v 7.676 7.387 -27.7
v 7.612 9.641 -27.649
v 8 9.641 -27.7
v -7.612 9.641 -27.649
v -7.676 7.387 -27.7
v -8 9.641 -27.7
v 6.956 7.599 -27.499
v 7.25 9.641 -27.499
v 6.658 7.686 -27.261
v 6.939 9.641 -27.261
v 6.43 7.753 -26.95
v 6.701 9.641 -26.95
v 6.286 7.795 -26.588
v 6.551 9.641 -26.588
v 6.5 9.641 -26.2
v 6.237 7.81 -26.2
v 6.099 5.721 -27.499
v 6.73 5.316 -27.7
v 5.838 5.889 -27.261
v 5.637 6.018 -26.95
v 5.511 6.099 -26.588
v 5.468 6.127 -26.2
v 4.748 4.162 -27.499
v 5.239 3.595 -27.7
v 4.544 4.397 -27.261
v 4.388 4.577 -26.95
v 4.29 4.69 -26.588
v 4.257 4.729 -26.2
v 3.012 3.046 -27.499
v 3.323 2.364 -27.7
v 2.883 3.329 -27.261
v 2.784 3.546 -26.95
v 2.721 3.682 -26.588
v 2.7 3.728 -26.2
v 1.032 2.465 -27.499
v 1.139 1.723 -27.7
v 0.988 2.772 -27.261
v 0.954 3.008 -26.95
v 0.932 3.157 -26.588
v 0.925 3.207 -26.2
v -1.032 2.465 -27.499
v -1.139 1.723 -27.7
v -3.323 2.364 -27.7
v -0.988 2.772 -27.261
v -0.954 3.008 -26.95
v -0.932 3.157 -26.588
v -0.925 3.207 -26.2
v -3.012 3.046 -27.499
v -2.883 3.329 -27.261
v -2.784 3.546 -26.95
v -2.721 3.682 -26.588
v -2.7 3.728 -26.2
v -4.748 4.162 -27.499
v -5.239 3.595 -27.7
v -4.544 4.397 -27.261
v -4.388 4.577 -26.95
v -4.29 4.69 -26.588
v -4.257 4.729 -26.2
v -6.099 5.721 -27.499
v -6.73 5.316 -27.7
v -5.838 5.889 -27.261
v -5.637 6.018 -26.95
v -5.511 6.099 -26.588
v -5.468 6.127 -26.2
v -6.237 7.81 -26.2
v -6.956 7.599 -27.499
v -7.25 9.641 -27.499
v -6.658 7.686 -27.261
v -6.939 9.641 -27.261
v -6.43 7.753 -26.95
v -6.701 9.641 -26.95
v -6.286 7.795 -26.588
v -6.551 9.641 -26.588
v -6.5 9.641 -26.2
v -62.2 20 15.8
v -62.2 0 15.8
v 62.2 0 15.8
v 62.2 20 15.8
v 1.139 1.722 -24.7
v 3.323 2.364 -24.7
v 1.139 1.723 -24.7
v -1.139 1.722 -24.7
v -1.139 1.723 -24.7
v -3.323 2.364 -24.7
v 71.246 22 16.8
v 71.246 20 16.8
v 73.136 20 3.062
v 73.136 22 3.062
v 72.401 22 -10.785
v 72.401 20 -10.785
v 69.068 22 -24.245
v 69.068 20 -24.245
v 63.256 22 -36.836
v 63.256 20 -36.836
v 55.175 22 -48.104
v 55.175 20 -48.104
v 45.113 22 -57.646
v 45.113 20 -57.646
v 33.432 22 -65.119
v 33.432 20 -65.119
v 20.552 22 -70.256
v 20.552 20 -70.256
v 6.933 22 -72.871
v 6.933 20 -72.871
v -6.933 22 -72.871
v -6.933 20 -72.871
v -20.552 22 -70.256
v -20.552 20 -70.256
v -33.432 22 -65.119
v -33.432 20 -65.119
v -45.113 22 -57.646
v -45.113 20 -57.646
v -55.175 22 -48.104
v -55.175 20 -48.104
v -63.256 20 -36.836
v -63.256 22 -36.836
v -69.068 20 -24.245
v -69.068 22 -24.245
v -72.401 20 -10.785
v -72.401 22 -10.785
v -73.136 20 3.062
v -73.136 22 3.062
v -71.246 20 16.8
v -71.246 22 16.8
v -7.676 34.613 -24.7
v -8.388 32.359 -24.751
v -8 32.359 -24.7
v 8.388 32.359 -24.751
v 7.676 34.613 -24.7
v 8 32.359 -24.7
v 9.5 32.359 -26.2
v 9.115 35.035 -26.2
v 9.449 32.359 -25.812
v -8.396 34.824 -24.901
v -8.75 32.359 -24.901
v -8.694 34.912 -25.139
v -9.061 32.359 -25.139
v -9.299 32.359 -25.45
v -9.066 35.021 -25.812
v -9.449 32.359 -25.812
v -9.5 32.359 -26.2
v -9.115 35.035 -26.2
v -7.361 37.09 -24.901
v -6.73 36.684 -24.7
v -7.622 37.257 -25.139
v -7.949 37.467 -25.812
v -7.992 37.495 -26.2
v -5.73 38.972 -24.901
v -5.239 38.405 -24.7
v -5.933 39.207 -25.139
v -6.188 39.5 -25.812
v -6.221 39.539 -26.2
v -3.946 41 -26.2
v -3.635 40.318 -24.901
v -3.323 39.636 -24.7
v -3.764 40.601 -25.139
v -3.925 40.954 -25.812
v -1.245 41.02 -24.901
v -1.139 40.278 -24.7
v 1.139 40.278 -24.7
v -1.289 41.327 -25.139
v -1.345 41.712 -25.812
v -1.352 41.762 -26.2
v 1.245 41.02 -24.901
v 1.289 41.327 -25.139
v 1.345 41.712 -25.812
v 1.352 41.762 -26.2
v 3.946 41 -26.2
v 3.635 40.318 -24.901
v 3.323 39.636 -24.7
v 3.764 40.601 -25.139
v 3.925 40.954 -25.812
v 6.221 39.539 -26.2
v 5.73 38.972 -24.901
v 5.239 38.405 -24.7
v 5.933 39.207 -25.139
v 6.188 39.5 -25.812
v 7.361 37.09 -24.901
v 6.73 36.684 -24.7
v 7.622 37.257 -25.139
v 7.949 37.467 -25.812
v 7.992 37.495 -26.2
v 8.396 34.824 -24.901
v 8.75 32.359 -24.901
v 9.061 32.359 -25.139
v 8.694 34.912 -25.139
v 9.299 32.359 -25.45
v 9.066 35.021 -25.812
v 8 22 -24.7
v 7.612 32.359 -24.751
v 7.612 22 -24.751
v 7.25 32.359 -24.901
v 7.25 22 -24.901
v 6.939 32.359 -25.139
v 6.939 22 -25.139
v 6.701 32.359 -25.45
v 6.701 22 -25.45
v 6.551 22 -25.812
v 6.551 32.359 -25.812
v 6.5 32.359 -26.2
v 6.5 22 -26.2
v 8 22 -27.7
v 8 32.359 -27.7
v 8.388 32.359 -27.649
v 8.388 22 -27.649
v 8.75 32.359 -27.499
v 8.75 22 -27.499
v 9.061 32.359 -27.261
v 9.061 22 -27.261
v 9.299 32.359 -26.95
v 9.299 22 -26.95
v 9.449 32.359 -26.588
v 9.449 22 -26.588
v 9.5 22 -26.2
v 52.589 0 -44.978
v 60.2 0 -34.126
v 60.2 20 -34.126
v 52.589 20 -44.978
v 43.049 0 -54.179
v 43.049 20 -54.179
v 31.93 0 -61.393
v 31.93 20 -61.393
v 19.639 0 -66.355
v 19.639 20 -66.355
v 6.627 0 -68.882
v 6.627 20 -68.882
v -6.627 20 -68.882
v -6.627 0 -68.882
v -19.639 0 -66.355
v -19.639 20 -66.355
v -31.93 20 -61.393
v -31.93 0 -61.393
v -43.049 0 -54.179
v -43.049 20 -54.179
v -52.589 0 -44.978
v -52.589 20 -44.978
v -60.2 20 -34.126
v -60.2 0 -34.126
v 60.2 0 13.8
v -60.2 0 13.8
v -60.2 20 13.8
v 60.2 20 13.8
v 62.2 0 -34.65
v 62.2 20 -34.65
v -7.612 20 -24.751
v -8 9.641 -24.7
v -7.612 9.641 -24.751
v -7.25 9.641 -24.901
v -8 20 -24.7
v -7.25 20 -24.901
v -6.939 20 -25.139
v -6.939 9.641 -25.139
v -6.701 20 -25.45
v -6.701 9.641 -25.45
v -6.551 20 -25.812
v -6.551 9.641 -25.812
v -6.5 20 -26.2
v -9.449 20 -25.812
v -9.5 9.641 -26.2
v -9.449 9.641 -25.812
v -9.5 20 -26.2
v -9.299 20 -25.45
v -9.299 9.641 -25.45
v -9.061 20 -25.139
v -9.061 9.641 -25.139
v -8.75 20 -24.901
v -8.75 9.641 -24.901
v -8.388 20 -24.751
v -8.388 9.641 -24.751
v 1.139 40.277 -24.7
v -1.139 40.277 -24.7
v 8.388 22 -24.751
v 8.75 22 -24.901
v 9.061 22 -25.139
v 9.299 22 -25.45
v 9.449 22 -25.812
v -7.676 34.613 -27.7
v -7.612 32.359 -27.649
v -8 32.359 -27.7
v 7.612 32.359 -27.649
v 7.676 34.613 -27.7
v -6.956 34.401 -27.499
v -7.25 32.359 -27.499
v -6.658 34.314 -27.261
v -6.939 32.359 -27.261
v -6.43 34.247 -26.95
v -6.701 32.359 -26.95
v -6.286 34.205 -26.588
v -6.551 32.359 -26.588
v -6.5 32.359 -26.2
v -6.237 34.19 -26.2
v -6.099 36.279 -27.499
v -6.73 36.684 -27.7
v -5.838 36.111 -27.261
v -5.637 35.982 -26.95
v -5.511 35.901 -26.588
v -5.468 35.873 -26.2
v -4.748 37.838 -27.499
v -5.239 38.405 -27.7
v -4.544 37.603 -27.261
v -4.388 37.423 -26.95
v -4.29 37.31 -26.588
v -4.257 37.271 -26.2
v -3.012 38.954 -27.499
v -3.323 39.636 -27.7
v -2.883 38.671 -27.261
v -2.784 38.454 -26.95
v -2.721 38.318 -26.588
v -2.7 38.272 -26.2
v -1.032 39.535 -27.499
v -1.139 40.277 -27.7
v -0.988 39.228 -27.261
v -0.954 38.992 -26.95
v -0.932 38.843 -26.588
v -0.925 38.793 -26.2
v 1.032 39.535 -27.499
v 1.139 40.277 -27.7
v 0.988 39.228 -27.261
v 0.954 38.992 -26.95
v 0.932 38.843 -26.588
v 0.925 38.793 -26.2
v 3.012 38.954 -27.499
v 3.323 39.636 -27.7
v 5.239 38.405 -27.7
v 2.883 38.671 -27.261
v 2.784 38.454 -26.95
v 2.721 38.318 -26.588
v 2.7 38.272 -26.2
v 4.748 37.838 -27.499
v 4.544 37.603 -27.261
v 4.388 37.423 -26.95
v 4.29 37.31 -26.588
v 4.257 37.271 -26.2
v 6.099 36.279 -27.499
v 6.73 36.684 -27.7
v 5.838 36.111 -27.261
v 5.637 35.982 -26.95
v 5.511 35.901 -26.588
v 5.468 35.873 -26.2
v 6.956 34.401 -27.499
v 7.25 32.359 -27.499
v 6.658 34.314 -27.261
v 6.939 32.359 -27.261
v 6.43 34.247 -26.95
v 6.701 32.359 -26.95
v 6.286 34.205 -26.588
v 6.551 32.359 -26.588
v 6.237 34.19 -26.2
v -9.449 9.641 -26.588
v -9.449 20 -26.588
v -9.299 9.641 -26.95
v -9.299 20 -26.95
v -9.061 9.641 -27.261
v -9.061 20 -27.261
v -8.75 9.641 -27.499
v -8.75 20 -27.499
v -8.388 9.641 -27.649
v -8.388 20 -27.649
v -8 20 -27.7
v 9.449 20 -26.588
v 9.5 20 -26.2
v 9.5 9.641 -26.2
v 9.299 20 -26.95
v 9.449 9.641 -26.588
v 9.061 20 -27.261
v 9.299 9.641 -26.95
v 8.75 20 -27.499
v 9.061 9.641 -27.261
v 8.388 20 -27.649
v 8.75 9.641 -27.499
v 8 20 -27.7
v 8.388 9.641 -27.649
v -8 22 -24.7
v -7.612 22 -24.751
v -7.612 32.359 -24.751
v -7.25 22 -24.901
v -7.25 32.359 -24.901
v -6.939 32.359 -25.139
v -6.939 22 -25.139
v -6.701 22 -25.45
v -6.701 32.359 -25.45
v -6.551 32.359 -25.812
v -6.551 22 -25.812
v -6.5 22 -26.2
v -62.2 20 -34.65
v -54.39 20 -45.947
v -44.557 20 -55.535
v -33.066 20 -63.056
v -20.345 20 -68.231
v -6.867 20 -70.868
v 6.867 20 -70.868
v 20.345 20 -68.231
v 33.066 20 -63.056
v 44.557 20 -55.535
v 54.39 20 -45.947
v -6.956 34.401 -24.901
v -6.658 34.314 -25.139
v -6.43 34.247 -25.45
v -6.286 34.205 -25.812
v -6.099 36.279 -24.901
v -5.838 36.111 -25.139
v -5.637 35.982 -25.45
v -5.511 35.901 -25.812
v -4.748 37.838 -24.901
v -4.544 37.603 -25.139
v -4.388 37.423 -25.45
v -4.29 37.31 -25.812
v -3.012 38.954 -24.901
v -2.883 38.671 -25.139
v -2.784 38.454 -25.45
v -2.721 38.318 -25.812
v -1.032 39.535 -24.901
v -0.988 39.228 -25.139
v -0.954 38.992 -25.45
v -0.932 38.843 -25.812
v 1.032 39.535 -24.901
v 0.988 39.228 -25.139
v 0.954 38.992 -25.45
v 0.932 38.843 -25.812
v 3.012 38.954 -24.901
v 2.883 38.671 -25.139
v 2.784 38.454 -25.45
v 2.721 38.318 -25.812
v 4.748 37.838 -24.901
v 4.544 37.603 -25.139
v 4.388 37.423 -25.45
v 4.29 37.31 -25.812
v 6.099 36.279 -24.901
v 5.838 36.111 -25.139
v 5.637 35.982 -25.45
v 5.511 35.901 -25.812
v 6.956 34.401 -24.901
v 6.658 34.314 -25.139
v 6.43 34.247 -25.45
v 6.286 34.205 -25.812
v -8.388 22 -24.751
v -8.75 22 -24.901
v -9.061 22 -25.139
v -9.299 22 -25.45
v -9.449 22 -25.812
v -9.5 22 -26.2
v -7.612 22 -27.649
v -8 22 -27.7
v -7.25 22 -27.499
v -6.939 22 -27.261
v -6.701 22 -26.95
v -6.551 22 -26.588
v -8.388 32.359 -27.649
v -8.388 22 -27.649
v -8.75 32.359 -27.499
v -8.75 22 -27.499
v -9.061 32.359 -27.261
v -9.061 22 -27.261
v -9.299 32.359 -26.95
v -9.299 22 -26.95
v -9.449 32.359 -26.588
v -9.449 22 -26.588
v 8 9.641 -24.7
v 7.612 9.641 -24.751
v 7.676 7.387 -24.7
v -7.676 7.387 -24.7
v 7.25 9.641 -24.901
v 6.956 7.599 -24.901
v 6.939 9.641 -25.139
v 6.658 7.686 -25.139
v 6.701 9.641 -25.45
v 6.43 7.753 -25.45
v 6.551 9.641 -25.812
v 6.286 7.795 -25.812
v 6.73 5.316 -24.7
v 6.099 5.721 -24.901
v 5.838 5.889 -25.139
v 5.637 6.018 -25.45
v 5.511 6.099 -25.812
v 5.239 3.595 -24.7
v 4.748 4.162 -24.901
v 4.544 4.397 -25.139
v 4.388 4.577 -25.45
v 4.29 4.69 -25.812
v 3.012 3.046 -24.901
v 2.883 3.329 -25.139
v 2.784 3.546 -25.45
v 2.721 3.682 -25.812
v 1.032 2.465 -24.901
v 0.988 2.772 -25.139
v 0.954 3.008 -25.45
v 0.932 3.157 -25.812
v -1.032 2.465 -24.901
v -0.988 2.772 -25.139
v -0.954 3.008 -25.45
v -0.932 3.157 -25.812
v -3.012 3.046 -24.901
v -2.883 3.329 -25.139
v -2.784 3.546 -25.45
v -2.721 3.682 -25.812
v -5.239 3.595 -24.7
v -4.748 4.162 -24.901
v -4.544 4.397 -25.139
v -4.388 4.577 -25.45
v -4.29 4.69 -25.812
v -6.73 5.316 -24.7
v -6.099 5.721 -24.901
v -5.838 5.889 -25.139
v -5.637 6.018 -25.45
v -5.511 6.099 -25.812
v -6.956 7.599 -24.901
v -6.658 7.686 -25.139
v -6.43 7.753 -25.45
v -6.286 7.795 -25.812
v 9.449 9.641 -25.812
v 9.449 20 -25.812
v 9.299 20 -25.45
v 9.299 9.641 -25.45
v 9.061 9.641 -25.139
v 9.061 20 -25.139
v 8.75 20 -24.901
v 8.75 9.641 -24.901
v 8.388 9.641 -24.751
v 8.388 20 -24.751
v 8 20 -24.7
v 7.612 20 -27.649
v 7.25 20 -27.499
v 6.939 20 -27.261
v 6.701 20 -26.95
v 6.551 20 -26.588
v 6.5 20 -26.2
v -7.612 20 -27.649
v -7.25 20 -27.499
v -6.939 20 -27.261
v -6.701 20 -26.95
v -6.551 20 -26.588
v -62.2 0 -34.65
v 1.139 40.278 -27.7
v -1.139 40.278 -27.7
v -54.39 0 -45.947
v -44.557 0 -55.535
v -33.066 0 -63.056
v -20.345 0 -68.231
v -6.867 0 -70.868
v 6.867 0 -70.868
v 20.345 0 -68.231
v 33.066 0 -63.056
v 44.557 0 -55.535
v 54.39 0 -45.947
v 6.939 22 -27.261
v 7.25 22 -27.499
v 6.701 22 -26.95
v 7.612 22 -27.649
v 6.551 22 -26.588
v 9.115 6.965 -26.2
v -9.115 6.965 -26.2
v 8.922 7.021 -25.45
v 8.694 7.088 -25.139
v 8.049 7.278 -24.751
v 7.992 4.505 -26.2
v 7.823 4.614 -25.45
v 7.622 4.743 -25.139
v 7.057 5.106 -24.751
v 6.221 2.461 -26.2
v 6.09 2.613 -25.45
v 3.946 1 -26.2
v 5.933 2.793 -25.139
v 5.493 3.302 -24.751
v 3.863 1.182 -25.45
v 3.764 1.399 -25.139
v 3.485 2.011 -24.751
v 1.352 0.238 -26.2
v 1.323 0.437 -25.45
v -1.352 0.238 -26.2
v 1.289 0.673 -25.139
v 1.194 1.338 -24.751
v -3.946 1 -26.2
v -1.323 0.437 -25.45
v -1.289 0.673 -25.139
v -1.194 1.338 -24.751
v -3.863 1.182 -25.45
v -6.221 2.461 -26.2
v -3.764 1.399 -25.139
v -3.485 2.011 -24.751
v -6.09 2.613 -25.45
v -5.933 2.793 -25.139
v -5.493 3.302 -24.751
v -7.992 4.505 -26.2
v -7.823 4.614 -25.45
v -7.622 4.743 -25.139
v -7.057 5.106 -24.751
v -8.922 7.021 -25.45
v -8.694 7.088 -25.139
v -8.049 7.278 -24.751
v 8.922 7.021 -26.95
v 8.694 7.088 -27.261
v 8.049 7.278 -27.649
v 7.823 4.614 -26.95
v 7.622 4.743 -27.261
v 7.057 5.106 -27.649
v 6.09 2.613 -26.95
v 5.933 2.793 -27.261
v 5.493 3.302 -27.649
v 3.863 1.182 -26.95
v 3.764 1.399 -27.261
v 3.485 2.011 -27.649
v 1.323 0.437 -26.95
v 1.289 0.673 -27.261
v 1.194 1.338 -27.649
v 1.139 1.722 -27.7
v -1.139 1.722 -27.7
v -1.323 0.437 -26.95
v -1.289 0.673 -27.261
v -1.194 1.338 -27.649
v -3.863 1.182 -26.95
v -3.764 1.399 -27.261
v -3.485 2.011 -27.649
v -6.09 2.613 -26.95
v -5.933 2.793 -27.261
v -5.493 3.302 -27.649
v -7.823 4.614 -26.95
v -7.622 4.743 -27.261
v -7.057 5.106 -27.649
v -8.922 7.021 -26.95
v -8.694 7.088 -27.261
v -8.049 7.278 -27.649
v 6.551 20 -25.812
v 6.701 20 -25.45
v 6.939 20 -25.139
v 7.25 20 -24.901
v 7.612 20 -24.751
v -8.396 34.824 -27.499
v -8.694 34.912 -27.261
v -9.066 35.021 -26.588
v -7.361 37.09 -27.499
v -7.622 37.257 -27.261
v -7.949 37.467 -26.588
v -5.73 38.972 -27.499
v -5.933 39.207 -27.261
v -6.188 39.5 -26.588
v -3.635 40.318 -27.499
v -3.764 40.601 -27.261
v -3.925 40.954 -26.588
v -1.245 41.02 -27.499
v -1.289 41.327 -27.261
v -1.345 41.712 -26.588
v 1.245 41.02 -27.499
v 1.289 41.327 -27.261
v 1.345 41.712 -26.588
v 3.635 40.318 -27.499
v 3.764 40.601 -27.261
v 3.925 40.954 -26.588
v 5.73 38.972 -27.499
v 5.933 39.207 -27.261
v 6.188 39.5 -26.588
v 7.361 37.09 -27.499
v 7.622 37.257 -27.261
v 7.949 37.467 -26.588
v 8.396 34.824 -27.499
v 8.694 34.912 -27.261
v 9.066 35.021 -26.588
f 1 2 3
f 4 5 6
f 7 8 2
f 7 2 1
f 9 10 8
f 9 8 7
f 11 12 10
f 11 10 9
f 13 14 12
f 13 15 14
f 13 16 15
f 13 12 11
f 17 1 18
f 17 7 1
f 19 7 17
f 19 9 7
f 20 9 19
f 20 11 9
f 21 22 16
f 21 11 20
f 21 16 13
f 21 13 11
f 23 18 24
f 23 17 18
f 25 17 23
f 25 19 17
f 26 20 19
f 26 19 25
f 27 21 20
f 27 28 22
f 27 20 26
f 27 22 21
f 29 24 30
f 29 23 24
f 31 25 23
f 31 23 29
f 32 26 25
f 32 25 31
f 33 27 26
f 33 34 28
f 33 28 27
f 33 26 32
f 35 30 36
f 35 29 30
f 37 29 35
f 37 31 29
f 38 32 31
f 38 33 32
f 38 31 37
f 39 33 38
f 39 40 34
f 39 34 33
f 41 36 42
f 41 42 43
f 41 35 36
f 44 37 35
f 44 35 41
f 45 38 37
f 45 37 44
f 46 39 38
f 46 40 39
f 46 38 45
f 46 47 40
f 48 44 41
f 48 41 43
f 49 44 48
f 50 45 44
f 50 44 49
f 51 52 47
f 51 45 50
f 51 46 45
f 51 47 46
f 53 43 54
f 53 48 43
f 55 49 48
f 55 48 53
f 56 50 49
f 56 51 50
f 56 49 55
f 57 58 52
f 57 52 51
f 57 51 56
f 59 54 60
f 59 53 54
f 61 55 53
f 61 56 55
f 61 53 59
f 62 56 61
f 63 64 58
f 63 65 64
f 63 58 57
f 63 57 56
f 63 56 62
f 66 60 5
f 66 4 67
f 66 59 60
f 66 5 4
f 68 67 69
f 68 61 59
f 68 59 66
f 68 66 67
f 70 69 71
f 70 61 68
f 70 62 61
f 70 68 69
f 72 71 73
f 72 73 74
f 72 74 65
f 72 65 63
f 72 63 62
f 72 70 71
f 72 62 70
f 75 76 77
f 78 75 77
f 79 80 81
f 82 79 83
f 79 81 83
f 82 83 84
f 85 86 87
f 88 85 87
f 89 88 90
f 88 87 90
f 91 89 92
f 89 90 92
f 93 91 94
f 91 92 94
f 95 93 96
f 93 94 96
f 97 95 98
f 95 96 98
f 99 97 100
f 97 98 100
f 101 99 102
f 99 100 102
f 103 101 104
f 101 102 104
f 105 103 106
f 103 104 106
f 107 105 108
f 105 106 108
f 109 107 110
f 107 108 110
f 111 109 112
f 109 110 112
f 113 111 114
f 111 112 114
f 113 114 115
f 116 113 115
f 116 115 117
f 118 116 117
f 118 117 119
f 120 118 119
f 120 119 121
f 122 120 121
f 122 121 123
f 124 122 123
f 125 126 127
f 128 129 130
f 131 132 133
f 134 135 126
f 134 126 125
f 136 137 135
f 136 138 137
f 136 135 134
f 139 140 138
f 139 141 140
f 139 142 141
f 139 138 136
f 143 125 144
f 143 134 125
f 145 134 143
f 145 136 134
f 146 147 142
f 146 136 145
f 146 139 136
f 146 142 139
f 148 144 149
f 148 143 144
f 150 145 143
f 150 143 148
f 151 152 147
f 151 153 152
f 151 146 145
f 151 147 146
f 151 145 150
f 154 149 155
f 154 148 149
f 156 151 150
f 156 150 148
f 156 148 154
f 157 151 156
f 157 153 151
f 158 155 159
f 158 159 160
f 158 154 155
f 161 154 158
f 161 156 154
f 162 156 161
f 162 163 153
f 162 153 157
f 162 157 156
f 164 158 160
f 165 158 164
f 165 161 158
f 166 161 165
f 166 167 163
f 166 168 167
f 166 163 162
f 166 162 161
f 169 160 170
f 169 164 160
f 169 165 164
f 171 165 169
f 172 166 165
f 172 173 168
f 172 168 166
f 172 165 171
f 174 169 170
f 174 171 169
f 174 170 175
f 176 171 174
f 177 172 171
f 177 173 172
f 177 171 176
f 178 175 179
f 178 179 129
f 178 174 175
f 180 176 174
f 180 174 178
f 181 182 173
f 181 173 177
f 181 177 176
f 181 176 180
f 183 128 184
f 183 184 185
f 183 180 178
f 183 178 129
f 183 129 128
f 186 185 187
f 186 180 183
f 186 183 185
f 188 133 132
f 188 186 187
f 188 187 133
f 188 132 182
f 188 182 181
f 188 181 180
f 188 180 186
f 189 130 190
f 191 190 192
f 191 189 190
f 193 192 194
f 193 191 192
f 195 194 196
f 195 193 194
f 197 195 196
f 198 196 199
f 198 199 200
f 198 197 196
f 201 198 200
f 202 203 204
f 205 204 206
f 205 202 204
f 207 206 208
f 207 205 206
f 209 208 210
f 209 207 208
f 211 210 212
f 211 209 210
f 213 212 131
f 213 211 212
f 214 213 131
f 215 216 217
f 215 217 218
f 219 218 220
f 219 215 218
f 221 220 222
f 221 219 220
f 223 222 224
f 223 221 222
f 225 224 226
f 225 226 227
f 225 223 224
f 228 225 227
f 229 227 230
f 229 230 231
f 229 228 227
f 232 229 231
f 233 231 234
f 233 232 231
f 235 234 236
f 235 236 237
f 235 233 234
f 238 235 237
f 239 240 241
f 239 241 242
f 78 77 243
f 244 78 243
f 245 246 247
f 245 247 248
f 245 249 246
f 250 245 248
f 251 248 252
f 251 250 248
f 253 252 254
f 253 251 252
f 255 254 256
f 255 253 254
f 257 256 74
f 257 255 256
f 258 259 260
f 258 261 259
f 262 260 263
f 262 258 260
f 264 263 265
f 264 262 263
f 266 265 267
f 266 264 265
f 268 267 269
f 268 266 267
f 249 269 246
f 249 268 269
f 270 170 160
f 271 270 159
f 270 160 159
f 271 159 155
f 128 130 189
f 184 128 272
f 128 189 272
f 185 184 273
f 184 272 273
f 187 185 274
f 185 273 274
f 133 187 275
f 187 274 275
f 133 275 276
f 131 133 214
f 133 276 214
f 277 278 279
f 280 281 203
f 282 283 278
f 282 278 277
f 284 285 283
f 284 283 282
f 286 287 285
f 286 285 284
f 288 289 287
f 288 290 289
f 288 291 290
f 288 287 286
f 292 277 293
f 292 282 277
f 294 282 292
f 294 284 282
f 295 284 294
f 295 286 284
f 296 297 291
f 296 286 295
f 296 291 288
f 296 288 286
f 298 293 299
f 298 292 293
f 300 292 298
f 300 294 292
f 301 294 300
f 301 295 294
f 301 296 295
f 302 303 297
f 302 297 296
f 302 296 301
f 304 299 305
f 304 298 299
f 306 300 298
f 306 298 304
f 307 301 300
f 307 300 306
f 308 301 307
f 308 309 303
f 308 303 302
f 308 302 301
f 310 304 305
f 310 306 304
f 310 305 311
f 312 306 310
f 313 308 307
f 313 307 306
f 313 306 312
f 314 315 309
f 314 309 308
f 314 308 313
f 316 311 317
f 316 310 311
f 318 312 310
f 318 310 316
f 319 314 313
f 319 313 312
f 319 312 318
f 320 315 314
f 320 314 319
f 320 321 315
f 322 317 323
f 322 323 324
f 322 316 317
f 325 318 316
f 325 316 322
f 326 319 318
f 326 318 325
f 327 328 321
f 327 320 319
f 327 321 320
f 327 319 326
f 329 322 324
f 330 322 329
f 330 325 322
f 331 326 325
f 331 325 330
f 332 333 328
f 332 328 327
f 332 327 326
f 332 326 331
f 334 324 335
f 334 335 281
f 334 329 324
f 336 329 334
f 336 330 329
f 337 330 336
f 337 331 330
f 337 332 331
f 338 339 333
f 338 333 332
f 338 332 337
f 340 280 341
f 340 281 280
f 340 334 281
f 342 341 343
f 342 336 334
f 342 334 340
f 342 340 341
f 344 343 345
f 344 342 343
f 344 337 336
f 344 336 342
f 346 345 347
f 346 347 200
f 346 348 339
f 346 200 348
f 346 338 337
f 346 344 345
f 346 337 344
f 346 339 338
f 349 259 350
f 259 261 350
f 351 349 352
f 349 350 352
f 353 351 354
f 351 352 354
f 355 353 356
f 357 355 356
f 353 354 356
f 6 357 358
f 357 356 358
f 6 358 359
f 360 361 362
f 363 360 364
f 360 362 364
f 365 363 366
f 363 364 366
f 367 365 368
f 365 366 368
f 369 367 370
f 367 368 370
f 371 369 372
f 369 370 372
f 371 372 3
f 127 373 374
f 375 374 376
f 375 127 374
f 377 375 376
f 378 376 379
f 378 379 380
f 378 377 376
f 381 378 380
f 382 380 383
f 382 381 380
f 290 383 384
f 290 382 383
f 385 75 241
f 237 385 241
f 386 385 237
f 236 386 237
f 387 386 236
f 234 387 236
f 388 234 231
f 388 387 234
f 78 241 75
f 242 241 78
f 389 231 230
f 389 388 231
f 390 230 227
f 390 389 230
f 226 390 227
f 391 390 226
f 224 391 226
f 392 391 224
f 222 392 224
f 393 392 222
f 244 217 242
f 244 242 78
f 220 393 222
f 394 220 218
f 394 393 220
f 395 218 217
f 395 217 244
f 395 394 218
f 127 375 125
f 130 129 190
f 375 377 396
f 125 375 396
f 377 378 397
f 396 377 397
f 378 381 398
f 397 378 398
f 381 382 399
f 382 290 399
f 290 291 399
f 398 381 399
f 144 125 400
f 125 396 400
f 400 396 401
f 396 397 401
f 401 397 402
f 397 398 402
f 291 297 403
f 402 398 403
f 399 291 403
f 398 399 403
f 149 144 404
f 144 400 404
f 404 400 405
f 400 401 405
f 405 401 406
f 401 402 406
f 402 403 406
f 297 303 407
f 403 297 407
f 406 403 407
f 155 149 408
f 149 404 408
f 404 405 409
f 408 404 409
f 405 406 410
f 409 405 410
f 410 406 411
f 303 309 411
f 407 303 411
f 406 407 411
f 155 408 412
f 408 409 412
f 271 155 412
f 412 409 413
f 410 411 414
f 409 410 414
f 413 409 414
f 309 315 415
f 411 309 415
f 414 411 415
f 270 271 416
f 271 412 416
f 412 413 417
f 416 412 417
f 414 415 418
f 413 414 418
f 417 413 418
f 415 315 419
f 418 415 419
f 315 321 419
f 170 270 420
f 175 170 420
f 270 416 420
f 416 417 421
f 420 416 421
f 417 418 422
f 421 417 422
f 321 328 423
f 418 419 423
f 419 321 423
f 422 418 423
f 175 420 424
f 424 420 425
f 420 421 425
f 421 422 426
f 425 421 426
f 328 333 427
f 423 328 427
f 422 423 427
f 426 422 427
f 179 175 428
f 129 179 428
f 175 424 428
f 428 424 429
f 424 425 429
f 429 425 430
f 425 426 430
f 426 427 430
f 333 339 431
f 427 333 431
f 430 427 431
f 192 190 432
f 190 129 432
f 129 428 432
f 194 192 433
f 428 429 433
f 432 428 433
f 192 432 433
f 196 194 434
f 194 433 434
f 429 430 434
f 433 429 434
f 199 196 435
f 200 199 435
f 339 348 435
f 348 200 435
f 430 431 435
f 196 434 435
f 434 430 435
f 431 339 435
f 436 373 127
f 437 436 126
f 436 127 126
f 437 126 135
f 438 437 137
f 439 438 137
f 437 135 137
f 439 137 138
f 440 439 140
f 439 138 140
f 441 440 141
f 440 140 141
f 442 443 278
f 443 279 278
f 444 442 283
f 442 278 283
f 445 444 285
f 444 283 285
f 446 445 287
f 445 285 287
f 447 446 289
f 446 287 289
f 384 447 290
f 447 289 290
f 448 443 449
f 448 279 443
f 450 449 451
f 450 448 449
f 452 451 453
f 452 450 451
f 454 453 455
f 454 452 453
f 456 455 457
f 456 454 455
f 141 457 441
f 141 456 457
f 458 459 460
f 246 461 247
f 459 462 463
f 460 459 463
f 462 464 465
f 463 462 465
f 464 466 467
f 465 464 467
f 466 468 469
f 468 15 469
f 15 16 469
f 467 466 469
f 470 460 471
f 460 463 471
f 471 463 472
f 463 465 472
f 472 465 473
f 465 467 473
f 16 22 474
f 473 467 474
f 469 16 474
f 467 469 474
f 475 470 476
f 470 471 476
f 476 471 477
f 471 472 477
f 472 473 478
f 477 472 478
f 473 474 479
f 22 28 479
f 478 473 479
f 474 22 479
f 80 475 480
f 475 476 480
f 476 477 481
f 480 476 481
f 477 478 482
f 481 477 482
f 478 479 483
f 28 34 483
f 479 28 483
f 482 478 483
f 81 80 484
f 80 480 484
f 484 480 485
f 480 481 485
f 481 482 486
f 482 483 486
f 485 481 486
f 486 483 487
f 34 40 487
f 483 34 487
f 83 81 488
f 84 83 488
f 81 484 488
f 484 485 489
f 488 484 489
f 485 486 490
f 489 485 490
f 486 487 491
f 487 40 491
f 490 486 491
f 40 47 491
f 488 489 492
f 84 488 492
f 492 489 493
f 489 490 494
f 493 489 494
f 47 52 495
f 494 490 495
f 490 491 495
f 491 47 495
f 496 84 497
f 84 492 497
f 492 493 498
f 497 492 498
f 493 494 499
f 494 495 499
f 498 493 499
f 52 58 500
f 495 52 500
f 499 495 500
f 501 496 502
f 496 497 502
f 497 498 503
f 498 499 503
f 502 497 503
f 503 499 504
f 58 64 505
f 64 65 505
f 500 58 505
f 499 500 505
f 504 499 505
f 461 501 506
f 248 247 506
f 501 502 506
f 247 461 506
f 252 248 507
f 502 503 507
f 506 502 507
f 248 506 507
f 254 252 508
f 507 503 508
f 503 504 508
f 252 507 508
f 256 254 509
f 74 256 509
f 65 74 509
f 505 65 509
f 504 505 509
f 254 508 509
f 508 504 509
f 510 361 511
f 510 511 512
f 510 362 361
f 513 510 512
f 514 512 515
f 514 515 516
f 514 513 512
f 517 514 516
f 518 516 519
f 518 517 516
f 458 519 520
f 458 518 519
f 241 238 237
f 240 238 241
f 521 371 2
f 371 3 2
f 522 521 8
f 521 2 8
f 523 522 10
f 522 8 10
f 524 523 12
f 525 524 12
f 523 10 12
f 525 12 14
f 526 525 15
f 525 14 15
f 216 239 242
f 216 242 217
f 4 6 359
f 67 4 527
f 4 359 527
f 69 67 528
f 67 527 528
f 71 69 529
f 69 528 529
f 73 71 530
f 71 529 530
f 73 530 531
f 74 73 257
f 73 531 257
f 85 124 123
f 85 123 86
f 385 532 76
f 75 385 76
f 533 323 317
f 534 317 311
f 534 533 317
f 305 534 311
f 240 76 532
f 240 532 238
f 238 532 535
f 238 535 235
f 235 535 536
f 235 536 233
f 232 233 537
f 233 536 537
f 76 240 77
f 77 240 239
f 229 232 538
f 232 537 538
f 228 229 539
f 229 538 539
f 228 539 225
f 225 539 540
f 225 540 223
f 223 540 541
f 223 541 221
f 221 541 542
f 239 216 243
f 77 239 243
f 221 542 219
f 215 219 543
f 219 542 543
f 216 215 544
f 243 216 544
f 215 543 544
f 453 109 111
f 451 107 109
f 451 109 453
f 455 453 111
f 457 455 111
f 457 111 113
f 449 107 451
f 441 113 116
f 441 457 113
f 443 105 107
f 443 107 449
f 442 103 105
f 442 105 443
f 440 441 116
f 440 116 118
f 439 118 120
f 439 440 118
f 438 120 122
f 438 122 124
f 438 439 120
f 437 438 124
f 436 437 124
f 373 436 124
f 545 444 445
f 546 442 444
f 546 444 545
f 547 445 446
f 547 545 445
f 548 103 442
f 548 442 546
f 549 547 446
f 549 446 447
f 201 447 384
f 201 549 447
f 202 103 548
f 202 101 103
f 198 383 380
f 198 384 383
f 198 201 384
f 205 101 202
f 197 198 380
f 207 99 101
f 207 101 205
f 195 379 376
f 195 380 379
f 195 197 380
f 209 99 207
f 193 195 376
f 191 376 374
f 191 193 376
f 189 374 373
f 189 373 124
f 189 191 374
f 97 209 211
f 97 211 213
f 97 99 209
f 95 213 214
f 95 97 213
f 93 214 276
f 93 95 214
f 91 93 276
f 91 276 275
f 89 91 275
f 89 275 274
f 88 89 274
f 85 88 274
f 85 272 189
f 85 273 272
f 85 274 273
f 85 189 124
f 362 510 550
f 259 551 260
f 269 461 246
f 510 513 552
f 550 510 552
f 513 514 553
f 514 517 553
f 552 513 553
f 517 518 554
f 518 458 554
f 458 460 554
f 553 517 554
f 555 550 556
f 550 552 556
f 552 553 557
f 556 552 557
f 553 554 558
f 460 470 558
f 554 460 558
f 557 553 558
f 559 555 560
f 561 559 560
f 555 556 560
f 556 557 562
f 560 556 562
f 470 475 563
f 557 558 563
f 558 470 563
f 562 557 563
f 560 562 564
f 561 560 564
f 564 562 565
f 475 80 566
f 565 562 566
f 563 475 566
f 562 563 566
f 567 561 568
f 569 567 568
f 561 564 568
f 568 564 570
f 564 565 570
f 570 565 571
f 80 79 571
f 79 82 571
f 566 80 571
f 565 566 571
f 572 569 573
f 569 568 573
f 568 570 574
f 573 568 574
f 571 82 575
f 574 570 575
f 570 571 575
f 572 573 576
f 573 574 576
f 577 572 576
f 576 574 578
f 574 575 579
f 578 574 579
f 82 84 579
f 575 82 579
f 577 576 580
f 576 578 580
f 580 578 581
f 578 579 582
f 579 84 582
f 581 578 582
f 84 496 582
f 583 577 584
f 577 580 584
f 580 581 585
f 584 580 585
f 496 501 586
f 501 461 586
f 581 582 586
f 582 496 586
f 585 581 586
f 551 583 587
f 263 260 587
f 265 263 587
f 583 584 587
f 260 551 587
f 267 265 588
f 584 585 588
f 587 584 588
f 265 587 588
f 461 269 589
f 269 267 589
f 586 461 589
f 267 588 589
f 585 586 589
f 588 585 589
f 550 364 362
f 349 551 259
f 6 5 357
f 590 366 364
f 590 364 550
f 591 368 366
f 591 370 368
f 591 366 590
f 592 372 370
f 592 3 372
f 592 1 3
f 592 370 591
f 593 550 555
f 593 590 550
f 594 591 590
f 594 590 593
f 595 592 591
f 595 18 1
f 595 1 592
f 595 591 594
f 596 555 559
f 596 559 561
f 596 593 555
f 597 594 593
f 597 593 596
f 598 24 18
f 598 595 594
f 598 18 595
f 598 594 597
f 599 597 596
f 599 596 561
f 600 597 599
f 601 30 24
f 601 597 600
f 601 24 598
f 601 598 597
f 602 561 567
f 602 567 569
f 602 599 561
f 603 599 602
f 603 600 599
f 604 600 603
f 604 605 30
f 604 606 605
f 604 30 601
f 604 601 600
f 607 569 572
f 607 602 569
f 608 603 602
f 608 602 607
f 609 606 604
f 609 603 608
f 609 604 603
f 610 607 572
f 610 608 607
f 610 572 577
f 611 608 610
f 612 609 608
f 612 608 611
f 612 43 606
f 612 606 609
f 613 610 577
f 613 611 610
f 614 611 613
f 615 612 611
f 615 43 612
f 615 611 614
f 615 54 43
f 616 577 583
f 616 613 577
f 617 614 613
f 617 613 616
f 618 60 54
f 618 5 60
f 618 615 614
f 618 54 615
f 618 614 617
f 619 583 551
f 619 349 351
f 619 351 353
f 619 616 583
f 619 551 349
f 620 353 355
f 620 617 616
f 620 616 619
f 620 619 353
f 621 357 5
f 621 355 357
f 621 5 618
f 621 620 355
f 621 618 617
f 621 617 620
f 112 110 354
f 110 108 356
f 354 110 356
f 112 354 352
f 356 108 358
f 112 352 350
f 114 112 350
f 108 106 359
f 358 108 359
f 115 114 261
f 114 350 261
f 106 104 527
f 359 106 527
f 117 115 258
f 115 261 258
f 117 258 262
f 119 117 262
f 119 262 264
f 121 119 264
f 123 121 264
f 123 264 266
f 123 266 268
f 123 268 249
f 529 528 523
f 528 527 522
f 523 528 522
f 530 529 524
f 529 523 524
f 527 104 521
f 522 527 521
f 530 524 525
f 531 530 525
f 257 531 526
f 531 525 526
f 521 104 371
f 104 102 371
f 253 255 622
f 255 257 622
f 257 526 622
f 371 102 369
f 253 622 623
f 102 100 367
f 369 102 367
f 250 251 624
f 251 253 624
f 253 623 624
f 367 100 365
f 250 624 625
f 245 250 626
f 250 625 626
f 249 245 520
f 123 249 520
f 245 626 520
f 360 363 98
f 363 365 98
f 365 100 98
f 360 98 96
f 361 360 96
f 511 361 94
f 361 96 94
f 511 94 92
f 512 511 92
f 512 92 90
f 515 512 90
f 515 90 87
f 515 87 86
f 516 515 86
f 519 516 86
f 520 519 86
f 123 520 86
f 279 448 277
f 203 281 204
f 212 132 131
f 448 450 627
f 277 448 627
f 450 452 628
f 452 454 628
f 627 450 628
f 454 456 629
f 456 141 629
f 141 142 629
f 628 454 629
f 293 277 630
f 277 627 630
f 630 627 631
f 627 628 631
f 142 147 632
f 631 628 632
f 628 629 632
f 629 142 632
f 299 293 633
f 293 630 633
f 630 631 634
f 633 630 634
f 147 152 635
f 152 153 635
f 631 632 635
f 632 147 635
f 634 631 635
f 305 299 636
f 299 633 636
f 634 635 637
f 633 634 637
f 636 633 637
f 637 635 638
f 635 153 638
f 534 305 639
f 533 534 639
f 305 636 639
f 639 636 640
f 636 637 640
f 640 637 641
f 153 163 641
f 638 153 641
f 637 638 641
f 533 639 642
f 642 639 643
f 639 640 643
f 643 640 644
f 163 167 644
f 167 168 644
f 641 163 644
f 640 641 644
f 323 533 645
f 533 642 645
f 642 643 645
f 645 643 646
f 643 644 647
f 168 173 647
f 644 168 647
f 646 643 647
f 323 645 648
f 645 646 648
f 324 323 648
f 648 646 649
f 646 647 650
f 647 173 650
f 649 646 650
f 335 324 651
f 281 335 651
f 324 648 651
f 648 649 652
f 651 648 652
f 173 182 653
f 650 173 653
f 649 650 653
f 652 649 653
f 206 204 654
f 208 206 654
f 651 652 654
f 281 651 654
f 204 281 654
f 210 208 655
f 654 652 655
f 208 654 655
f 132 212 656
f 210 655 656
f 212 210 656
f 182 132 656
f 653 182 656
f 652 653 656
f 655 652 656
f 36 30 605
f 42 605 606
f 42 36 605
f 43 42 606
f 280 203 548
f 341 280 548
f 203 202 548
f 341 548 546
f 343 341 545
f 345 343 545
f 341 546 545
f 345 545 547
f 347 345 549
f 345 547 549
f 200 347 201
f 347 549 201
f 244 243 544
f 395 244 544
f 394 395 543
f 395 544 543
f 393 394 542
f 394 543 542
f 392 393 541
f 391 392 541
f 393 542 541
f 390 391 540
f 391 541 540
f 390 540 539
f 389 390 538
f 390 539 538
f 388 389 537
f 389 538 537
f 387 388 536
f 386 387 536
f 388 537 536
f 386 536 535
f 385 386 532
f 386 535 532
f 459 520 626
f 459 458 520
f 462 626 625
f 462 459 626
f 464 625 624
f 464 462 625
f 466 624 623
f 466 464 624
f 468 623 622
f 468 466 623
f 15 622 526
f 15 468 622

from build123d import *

# Parameters (mm, degrees)
BOSS_EXTRUDE1_DEPTH      = 20
BOSS_EXTRUDE1_2_DEPTH    = 20
SKETCH2_R                = 73.2
BOSS_EXTRUDE2_DEPTH      = 2
BODY_DELETE_KEEP_1_DEPTH = 22
BOSS_EXTRUDE3_DEPTH      = 1.5
BOSS_EXTRUDE3_DEPTH_BACK = 1.5
FILLET1_R                = 1.5


# Read off the part's stored shape, not the designer's step: Body-Delete/Keep 1
with BuildPart() as part:
    # Sketch1 → Boss-Extrude1 (new body)
    with BuildSketch(Plane(origin=(0, 0, 0), x_dir=(1, 0, 0), z_dir=(0, 1, 0))):
        with BuildLine():
            Line((62.2, -17.8), (-62.2, -17.8))
            Line((-62.2, -17.8), (-62.2, -34.649675323))
            ThreePointArc((-62.2, -34.649675323), (0, -71.2), (62.2, -34.649675323))
            Line((62.2, -34.649675323), (62.2, -17.8))
        make_face()
        with BuildLine():
            Line((60.2, -34.126236241), (60.2, -19.8))
            Line((60.2, -19.8), (-60.2, -19.8))
            Line((-60.2, -19.8), (-60.2, -34.126236241))
            ThreePointArc((-60.2, -34.126236241), (0, -69.2), (60.2, -34.126236241))
        make_face(mode=Mode.SUBTRACT)
    extrude(amount=BOSS_EXTRUDE1_DEPTH)


with BuildPart() as body_2:
    # Sketch1 → Boss-Extrude1 2 (new body)
    with BuildSketch(Plane(origin=(0, 0, 0), x_dir=(1, 0, 0), z_dir=(0, 1, 0))):
        with BuildLine():
            Line((-62.2, -15.8), (62.2, -15.8))
            Line((62.2, -15.8), (62.2, 34.649675323))
            ThreePointArc((62.2, 34.649675323), (0, 71.2), (-62.2, 34.649675323))
            Line((-62.2, 34.649675323), (-62.2, -15.8))
        make_face()
        with BuildLine():
            Line((-60.2, 34.126236241), (-60.2, -13.8))
            Line((-60.2, -13.8), (60.2, -13.8))
            Line((60.2, -13.8), (60.2, 34.126236241))
            ThreePointArc((60.2, 34.126236241), (0, 69.2), (-60.2, 34.126236241))
        make_face(mode=Mode.SUBTRACT)
    extrude(amount=BOSS_EXTRUDE1_2_DEPTH)


with BuildPart() as body_3:
    # Sketch2 → Boss-Extrude2 (new body)
    with BuildSketch(Plane(origin=(0, 20, 0), x_dir=(1, 0, 0), z_dir=(0, 1, 0))):
        with Locations(Location((0, 0, 0), (0, 0, 270))):
            Circle(SKETCH2_R)
    extrude(amount=BOSS_EXTRUDE2_DEPTH)


with BuildPart() as body_4:
    # Split1: the piece on the far side of the plane
    add(body_3.part)
    split(bisect_by=Plane.XY.offset(16.8), keep=Keep.BOTTOM)

    # Sketch3 → Boss-Extrude3 (add, two sides: drawn at the far end of the back side and taken through both)
    with BuildSketch(Plane(origin=(0, 0, -26.2), x_dir=(-1, 0, 0), z_dir=(0, 0, -1)).offset(-BOSS_EXTRUDE3_DEPTH_BACK)):
        with BuildLine():
            Line((9.5, 9.641102956), (9.5, 32.358897044))
            ThreePointArc((9.5, 32.358897044), (0, 41.858897044), (-9.5, 32.358897044))
            Line((-9.5, 32.358897044), (-9.5, 9.641102956))
            ThreePointArc((-9.5, 9.641102956), (0, 0.141102956), (9.5, 9.641102956))
        make_face()
        with BuildLine():
            ThreePointArc((6.5, 32.358897044), (0, 38.858897044), (-6.5, 32.358897044))
            Line((-6.5, 32.358897044), (-6.5, 9.641102956))
            ThreePointArc((-6.5, 9.641102956), (0, 3.141102956), (6.5, 9.641102956))
            Line((6.5, 9.641102956), (6.5, 32.358897044))
        make_face(mode=Mode.SUBTRACT)
    extrude(amount=BOSS_EXTRUDE3_DEPTH + BOSS_EXTRUDE3_DEPTH_BACK)

    # Fillet1
    fillet1_edges = [body_4.edges().sort_by_distance(p)[0] for p in [
        (6.5, 14.820551478, -27.7),
        (-9.5, 14.820551478, -27.7),
        (-6.5, 14.820551478, -27.7),
        (0, 3.141102956, -27.7),
        (0, 0.141102956, -27.7),
        (9.5, 14.820551478, -27.7),
        (6.5, 14.820551478, -24.7),
        (0, 3.141102956, -24.7),
        (-6.5, 14.820551478, -24.7),
        (-9.5, 14.820551478, -24.7),
        (0, 0.141102956, -24.7),
        (9.5, 14.820551478, -24.7),
        (9.5, 27.179448522, -24.7),
        (0, 41.858897044, -24.7),
        (-9.5, 27.179448522, -24.7),
        (-9.5, 27.179448522, -27.7),
        (9.5, 27.179448522, -27.7),
        (0, 41.858897044, -27.7),
        (6.5, 27.179448522, -27.7),
        (0, 38.858897044, -27.7),
        (-6.5, 27.179448522, -27.7),
        (-6.5, 27.179448522, -24.7),
        (6.5, 27.179448522, -24.7),
        (0, 38.858897044, -24.7),
    ]]
    fillet(fillet1_edges, radius=FILLET1_R - 0.0001)  # a hair under: the kernel refuses the full size


with BuildPart() as body_3_1:
    add(body_3.part)

    # Split1
    split(bisect_by=Plane.XY.offset(16.8), keep=Keep.TOP)


with BuildPart() as body_delete_keep_1_tool:
    # Body-Delete/Keep 1 outline → Body-Delete/Keep 1 (new body)
    with BuildSketch(Plane(origin=(0, 0, 0), x_dir=(1, 0, 0), z_dir=(0, 1, 0))):
        with BuildLine():
            ThreePointArc((-71.246052522, -16.8), (0, -73.2), (71.246052522, -16.8))
            Line((71.246052522, -16.8), (-71.246052522, -16.8))
        make_face()
    extrude(amount=BODY_DELETE_KEEP_1_DEPTH)


with BuildPart() as part_1:
    add(part.part)

    # Body-Delete/Keep 1: cut by body_delete_keep_1_tool
    add(body_delete_keep_1_tool.part, mode=Mode.SUBTRACT)


with BuildPart() as body_3_2:
    add(body_3_1.part)

    # Body-Delete/Keep 1: cut by body_delete_keep_1_tool
    add(body_delete_keep_1_tool.part, mode=Mode.SUBTRACT)


solid = Compound([body_2.part, body_4.part])
